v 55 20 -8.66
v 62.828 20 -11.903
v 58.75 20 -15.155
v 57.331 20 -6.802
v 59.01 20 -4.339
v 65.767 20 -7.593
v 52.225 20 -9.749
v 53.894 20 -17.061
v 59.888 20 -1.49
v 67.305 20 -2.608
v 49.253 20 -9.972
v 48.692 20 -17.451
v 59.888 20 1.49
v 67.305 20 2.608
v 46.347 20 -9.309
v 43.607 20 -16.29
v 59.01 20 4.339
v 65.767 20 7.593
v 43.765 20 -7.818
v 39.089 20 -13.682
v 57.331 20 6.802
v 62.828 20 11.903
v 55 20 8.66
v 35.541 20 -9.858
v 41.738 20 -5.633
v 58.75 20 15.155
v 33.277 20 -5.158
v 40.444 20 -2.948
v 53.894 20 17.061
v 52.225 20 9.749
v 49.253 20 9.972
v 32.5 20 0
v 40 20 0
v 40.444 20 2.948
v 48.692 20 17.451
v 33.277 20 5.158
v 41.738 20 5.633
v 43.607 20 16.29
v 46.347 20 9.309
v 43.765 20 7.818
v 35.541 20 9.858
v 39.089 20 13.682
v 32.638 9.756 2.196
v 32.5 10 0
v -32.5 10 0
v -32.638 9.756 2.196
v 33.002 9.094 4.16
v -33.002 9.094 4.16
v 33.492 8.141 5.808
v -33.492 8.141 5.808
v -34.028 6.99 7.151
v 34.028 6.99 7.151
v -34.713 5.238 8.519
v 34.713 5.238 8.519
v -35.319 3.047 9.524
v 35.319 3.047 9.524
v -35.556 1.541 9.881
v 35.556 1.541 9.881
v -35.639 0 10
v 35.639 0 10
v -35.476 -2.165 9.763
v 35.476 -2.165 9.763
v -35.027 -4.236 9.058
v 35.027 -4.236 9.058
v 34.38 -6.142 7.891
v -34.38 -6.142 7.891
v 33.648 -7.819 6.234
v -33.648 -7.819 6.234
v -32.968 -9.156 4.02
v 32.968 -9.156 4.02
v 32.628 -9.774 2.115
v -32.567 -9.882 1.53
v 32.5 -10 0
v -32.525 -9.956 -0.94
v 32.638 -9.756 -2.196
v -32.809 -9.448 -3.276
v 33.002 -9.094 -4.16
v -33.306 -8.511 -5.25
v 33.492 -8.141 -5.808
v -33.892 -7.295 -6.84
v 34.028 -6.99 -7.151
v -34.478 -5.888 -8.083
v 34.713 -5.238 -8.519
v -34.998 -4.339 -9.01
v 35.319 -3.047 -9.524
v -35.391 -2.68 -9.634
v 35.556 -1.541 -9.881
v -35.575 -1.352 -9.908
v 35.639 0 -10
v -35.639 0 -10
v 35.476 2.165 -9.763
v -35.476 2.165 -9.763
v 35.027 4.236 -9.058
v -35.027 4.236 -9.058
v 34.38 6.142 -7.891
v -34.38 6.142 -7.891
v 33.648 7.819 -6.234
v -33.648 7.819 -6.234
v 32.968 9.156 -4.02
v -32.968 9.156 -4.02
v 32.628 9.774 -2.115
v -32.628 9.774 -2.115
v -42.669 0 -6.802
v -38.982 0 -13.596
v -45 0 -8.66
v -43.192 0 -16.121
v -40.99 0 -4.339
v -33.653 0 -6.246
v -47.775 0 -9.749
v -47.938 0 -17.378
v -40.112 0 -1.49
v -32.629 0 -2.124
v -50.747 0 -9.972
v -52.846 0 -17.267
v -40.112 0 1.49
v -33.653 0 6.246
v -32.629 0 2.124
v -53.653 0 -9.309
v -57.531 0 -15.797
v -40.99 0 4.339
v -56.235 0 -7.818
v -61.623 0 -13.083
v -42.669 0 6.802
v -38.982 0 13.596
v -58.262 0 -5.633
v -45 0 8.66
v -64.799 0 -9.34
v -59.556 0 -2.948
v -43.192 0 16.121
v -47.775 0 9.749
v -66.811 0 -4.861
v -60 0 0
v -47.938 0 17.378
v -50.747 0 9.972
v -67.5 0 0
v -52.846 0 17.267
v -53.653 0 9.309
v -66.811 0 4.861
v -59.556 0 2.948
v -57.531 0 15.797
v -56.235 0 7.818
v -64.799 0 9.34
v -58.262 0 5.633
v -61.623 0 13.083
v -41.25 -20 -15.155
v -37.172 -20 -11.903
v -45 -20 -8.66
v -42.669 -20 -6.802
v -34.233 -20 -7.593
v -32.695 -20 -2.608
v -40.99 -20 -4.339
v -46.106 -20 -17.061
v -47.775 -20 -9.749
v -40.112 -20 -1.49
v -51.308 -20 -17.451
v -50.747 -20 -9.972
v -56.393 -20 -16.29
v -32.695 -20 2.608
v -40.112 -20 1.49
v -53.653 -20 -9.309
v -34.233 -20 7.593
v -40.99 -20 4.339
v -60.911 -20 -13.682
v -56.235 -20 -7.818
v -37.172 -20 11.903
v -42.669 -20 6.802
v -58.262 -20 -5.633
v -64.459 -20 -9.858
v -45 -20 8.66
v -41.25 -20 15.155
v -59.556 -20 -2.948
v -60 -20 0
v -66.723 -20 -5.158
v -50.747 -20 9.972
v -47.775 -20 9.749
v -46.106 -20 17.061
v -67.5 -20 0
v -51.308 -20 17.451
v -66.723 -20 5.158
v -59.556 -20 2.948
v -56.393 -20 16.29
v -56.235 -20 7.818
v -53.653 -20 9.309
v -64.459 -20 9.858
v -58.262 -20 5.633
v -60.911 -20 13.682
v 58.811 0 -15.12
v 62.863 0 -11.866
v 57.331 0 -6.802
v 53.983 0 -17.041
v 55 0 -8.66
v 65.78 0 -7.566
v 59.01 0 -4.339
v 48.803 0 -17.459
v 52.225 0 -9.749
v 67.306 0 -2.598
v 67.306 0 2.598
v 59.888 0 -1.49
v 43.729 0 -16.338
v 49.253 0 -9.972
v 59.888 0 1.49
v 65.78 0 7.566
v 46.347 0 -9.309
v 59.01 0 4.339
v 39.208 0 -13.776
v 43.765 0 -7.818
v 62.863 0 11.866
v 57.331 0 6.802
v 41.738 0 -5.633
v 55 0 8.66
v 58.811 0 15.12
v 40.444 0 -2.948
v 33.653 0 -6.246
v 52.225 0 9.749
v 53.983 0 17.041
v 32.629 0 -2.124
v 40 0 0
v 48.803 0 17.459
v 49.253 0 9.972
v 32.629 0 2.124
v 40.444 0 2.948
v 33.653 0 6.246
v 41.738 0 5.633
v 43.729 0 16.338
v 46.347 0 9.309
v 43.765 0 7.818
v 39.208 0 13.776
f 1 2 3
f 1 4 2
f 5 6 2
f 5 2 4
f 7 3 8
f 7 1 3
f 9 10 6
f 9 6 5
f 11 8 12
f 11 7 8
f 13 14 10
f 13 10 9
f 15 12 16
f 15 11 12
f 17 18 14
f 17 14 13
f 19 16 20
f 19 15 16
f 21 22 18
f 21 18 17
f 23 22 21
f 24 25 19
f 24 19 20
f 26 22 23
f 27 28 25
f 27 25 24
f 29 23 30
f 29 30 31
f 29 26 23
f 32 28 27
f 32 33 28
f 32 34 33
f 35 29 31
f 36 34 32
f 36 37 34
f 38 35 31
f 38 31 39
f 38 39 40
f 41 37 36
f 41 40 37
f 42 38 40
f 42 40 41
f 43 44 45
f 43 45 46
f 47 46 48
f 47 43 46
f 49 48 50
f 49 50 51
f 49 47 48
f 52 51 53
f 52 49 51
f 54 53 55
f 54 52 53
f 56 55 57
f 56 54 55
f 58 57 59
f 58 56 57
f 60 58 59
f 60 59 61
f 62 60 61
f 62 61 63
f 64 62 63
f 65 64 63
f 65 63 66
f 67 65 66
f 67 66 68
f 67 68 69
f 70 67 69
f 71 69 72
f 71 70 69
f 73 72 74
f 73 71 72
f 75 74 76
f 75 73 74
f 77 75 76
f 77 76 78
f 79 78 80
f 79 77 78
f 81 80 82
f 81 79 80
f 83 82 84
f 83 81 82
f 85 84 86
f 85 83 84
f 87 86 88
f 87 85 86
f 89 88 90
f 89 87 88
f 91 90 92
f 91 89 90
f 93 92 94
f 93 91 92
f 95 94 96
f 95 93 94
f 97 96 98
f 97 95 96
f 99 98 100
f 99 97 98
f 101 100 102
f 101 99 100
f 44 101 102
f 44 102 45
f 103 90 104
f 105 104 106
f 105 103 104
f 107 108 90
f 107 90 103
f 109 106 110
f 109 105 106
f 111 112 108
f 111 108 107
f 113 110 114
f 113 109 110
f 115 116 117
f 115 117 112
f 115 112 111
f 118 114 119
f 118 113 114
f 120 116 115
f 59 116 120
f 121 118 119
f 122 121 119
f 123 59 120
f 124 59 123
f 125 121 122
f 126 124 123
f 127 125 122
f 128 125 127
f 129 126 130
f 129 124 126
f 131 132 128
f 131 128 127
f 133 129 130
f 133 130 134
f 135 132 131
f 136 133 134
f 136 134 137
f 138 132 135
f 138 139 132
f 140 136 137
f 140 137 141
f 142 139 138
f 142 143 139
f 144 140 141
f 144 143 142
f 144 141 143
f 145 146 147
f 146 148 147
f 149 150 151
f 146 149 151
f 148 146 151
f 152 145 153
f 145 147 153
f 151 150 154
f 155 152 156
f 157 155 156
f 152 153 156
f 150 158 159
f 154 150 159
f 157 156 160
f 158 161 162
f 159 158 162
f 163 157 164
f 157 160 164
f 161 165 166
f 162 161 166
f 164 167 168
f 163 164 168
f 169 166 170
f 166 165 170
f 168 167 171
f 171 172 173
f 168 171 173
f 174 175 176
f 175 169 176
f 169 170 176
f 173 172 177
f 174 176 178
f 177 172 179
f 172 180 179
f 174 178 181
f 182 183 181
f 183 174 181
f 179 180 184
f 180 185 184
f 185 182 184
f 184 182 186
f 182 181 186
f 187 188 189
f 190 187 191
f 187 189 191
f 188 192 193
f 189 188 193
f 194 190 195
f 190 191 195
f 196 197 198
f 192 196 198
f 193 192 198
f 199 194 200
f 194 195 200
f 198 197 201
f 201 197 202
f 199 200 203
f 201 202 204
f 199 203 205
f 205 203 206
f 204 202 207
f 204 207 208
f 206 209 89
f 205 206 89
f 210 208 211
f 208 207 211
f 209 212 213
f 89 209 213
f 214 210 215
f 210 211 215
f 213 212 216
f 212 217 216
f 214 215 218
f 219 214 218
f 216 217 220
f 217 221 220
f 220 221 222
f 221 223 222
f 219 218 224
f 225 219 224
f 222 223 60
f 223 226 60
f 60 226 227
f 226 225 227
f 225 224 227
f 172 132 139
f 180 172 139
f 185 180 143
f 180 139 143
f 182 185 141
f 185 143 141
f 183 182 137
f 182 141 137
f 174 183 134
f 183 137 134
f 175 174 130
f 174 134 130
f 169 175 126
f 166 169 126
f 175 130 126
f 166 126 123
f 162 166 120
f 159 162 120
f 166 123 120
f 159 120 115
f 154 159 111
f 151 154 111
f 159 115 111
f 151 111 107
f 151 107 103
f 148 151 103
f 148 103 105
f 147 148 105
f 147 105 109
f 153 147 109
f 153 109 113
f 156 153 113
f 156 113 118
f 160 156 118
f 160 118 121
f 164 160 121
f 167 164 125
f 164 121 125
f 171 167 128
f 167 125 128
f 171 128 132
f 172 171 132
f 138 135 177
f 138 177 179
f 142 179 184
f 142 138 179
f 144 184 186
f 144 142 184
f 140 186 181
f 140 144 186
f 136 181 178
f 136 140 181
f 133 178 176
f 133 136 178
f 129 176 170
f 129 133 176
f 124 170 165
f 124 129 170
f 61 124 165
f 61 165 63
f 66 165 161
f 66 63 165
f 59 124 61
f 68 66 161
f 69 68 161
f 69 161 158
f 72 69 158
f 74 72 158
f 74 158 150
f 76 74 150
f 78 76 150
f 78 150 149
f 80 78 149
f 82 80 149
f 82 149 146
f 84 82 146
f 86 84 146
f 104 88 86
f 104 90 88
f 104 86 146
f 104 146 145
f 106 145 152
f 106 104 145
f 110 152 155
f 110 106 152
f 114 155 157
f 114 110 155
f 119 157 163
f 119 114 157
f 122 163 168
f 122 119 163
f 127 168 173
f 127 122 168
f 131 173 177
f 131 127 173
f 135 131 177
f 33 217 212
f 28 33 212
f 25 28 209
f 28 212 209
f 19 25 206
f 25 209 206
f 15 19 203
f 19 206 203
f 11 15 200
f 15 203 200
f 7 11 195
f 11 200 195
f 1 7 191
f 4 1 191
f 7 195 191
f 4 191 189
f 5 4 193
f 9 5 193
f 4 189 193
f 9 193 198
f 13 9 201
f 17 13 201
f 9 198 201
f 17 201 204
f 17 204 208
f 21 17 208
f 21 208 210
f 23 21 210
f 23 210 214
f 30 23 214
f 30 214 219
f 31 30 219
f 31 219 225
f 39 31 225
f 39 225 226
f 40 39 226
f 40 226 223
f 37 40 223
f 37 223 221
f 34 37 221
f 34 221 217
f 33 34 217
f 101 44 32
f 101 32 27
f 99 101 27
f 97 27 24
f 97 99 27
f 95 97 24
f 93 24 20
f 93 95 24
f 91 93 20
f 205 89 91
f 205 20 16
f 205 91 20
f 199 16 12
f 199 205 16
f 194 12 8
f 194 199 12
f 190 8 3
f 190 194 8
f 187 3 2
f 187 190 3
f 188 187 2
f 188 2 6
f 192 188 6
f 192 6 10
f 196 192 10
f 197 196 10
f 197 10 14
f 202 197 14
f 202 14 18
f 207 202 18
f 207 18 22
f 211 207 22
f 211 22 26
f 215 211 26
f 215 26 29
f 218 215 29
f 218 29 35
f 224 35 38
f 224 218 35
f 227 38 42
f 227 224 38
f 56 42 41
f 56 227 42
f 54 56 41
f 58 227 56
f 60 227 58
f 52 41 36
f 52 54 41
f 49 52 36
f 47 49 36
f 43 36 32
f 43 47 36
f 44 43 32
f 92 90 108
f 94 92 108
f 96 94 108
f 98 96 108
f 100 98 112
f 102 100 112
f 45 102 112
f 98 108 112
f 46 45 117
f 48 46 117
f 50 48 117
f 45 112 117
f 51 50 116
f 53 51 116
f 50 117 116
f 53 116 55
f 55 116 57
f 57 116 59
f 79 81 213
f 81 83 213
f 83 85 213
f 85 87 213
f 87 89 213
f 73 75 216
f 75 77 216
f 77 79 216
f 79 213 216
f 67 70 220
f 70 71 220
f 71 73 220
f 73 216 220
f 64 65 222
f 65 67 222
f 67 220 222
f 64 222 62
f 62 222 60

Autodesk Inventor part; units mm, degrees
ref_plane "YZ Plane" through (0, 0, 0) normal (1, 0, 0) x (0, 1, 0)
ref_plane "XZ Plane" through (0, 0, 0) normal (0, 1, 0) x (-1, 0, 0)
ref_plane "XY Plane" through (0, 0, 0) normal (0, 0, 1) x (1, 0, 0)
sketch "Sketch1" plane through (0, 0, 0) normal (0, 0, 1) x (1, 0, 0)
  line L0 (-50, 0) -> (50, 0)
  line L1 (0, 0) -> (0, 34.9563) construction
  line L2 (-50, 0) -> (-50, 10)
  line L3 (-50, 10) -> (50, 10)
  line L4 (50, 10) -> (50, 0)
  dimension "d0" = 100
  dimension "d1" = 10
revolve "Revolution1" add sketch "Sketch1" angle 360 about axis through (-50, 0, 0) along (1, 0, 0)
sketch "Sketch2" plane through (0, 0, 0) normal (0, 1, 0) x (-1, 0, 0)
  line L0 (-50, 10) -> (-50, -10) projected
  circle A0 centre (-50, 0) radius 17.5
  circle A1 centre (-50, 0) radius 10
  point P0 (0, 0)
  dimension "d3" = 35
  dimension "d4" = 20
extrude "Extrusion1" add sketch "Sketch2" along normal blind 20
extrude "Extrusion2" cut sketch "Sketch2" against normal blind 20 contours A1 L0 | A0 picked at (-47.9217, -2.6061)
extrude "Extrusion3" cut sketch "Sketch2" along normal blind 20 contours A1 L0 picked at (-47.9217, -2.6061)
sketch "Sketch4" plane through (0, 0, 0) normal (0, 1, 0) x (-1, 0, 0)
  line L0 (50, 10) -> (50, -10) projected
  circle A0 centre (50, 0) radius 17.5
  circle A1 centre (50, 0) radius 10
  point P0 (0, 0)
  dimension "d17" = 35
  dimension "d18" = 20
extrude "Extrusion6" add sketch "Sketch4" against normal blind 20
extrude "Extrusion7" cut sketch "Sketch4" along normal blind 20 contours L0 A1 | A0 picked at (46.9919, -2.3982)
extrude "Extrusion8" cut sketch "Sketch4" against normal blind 20 contours L0 A1 picked at (46.9919, -2.3982)
